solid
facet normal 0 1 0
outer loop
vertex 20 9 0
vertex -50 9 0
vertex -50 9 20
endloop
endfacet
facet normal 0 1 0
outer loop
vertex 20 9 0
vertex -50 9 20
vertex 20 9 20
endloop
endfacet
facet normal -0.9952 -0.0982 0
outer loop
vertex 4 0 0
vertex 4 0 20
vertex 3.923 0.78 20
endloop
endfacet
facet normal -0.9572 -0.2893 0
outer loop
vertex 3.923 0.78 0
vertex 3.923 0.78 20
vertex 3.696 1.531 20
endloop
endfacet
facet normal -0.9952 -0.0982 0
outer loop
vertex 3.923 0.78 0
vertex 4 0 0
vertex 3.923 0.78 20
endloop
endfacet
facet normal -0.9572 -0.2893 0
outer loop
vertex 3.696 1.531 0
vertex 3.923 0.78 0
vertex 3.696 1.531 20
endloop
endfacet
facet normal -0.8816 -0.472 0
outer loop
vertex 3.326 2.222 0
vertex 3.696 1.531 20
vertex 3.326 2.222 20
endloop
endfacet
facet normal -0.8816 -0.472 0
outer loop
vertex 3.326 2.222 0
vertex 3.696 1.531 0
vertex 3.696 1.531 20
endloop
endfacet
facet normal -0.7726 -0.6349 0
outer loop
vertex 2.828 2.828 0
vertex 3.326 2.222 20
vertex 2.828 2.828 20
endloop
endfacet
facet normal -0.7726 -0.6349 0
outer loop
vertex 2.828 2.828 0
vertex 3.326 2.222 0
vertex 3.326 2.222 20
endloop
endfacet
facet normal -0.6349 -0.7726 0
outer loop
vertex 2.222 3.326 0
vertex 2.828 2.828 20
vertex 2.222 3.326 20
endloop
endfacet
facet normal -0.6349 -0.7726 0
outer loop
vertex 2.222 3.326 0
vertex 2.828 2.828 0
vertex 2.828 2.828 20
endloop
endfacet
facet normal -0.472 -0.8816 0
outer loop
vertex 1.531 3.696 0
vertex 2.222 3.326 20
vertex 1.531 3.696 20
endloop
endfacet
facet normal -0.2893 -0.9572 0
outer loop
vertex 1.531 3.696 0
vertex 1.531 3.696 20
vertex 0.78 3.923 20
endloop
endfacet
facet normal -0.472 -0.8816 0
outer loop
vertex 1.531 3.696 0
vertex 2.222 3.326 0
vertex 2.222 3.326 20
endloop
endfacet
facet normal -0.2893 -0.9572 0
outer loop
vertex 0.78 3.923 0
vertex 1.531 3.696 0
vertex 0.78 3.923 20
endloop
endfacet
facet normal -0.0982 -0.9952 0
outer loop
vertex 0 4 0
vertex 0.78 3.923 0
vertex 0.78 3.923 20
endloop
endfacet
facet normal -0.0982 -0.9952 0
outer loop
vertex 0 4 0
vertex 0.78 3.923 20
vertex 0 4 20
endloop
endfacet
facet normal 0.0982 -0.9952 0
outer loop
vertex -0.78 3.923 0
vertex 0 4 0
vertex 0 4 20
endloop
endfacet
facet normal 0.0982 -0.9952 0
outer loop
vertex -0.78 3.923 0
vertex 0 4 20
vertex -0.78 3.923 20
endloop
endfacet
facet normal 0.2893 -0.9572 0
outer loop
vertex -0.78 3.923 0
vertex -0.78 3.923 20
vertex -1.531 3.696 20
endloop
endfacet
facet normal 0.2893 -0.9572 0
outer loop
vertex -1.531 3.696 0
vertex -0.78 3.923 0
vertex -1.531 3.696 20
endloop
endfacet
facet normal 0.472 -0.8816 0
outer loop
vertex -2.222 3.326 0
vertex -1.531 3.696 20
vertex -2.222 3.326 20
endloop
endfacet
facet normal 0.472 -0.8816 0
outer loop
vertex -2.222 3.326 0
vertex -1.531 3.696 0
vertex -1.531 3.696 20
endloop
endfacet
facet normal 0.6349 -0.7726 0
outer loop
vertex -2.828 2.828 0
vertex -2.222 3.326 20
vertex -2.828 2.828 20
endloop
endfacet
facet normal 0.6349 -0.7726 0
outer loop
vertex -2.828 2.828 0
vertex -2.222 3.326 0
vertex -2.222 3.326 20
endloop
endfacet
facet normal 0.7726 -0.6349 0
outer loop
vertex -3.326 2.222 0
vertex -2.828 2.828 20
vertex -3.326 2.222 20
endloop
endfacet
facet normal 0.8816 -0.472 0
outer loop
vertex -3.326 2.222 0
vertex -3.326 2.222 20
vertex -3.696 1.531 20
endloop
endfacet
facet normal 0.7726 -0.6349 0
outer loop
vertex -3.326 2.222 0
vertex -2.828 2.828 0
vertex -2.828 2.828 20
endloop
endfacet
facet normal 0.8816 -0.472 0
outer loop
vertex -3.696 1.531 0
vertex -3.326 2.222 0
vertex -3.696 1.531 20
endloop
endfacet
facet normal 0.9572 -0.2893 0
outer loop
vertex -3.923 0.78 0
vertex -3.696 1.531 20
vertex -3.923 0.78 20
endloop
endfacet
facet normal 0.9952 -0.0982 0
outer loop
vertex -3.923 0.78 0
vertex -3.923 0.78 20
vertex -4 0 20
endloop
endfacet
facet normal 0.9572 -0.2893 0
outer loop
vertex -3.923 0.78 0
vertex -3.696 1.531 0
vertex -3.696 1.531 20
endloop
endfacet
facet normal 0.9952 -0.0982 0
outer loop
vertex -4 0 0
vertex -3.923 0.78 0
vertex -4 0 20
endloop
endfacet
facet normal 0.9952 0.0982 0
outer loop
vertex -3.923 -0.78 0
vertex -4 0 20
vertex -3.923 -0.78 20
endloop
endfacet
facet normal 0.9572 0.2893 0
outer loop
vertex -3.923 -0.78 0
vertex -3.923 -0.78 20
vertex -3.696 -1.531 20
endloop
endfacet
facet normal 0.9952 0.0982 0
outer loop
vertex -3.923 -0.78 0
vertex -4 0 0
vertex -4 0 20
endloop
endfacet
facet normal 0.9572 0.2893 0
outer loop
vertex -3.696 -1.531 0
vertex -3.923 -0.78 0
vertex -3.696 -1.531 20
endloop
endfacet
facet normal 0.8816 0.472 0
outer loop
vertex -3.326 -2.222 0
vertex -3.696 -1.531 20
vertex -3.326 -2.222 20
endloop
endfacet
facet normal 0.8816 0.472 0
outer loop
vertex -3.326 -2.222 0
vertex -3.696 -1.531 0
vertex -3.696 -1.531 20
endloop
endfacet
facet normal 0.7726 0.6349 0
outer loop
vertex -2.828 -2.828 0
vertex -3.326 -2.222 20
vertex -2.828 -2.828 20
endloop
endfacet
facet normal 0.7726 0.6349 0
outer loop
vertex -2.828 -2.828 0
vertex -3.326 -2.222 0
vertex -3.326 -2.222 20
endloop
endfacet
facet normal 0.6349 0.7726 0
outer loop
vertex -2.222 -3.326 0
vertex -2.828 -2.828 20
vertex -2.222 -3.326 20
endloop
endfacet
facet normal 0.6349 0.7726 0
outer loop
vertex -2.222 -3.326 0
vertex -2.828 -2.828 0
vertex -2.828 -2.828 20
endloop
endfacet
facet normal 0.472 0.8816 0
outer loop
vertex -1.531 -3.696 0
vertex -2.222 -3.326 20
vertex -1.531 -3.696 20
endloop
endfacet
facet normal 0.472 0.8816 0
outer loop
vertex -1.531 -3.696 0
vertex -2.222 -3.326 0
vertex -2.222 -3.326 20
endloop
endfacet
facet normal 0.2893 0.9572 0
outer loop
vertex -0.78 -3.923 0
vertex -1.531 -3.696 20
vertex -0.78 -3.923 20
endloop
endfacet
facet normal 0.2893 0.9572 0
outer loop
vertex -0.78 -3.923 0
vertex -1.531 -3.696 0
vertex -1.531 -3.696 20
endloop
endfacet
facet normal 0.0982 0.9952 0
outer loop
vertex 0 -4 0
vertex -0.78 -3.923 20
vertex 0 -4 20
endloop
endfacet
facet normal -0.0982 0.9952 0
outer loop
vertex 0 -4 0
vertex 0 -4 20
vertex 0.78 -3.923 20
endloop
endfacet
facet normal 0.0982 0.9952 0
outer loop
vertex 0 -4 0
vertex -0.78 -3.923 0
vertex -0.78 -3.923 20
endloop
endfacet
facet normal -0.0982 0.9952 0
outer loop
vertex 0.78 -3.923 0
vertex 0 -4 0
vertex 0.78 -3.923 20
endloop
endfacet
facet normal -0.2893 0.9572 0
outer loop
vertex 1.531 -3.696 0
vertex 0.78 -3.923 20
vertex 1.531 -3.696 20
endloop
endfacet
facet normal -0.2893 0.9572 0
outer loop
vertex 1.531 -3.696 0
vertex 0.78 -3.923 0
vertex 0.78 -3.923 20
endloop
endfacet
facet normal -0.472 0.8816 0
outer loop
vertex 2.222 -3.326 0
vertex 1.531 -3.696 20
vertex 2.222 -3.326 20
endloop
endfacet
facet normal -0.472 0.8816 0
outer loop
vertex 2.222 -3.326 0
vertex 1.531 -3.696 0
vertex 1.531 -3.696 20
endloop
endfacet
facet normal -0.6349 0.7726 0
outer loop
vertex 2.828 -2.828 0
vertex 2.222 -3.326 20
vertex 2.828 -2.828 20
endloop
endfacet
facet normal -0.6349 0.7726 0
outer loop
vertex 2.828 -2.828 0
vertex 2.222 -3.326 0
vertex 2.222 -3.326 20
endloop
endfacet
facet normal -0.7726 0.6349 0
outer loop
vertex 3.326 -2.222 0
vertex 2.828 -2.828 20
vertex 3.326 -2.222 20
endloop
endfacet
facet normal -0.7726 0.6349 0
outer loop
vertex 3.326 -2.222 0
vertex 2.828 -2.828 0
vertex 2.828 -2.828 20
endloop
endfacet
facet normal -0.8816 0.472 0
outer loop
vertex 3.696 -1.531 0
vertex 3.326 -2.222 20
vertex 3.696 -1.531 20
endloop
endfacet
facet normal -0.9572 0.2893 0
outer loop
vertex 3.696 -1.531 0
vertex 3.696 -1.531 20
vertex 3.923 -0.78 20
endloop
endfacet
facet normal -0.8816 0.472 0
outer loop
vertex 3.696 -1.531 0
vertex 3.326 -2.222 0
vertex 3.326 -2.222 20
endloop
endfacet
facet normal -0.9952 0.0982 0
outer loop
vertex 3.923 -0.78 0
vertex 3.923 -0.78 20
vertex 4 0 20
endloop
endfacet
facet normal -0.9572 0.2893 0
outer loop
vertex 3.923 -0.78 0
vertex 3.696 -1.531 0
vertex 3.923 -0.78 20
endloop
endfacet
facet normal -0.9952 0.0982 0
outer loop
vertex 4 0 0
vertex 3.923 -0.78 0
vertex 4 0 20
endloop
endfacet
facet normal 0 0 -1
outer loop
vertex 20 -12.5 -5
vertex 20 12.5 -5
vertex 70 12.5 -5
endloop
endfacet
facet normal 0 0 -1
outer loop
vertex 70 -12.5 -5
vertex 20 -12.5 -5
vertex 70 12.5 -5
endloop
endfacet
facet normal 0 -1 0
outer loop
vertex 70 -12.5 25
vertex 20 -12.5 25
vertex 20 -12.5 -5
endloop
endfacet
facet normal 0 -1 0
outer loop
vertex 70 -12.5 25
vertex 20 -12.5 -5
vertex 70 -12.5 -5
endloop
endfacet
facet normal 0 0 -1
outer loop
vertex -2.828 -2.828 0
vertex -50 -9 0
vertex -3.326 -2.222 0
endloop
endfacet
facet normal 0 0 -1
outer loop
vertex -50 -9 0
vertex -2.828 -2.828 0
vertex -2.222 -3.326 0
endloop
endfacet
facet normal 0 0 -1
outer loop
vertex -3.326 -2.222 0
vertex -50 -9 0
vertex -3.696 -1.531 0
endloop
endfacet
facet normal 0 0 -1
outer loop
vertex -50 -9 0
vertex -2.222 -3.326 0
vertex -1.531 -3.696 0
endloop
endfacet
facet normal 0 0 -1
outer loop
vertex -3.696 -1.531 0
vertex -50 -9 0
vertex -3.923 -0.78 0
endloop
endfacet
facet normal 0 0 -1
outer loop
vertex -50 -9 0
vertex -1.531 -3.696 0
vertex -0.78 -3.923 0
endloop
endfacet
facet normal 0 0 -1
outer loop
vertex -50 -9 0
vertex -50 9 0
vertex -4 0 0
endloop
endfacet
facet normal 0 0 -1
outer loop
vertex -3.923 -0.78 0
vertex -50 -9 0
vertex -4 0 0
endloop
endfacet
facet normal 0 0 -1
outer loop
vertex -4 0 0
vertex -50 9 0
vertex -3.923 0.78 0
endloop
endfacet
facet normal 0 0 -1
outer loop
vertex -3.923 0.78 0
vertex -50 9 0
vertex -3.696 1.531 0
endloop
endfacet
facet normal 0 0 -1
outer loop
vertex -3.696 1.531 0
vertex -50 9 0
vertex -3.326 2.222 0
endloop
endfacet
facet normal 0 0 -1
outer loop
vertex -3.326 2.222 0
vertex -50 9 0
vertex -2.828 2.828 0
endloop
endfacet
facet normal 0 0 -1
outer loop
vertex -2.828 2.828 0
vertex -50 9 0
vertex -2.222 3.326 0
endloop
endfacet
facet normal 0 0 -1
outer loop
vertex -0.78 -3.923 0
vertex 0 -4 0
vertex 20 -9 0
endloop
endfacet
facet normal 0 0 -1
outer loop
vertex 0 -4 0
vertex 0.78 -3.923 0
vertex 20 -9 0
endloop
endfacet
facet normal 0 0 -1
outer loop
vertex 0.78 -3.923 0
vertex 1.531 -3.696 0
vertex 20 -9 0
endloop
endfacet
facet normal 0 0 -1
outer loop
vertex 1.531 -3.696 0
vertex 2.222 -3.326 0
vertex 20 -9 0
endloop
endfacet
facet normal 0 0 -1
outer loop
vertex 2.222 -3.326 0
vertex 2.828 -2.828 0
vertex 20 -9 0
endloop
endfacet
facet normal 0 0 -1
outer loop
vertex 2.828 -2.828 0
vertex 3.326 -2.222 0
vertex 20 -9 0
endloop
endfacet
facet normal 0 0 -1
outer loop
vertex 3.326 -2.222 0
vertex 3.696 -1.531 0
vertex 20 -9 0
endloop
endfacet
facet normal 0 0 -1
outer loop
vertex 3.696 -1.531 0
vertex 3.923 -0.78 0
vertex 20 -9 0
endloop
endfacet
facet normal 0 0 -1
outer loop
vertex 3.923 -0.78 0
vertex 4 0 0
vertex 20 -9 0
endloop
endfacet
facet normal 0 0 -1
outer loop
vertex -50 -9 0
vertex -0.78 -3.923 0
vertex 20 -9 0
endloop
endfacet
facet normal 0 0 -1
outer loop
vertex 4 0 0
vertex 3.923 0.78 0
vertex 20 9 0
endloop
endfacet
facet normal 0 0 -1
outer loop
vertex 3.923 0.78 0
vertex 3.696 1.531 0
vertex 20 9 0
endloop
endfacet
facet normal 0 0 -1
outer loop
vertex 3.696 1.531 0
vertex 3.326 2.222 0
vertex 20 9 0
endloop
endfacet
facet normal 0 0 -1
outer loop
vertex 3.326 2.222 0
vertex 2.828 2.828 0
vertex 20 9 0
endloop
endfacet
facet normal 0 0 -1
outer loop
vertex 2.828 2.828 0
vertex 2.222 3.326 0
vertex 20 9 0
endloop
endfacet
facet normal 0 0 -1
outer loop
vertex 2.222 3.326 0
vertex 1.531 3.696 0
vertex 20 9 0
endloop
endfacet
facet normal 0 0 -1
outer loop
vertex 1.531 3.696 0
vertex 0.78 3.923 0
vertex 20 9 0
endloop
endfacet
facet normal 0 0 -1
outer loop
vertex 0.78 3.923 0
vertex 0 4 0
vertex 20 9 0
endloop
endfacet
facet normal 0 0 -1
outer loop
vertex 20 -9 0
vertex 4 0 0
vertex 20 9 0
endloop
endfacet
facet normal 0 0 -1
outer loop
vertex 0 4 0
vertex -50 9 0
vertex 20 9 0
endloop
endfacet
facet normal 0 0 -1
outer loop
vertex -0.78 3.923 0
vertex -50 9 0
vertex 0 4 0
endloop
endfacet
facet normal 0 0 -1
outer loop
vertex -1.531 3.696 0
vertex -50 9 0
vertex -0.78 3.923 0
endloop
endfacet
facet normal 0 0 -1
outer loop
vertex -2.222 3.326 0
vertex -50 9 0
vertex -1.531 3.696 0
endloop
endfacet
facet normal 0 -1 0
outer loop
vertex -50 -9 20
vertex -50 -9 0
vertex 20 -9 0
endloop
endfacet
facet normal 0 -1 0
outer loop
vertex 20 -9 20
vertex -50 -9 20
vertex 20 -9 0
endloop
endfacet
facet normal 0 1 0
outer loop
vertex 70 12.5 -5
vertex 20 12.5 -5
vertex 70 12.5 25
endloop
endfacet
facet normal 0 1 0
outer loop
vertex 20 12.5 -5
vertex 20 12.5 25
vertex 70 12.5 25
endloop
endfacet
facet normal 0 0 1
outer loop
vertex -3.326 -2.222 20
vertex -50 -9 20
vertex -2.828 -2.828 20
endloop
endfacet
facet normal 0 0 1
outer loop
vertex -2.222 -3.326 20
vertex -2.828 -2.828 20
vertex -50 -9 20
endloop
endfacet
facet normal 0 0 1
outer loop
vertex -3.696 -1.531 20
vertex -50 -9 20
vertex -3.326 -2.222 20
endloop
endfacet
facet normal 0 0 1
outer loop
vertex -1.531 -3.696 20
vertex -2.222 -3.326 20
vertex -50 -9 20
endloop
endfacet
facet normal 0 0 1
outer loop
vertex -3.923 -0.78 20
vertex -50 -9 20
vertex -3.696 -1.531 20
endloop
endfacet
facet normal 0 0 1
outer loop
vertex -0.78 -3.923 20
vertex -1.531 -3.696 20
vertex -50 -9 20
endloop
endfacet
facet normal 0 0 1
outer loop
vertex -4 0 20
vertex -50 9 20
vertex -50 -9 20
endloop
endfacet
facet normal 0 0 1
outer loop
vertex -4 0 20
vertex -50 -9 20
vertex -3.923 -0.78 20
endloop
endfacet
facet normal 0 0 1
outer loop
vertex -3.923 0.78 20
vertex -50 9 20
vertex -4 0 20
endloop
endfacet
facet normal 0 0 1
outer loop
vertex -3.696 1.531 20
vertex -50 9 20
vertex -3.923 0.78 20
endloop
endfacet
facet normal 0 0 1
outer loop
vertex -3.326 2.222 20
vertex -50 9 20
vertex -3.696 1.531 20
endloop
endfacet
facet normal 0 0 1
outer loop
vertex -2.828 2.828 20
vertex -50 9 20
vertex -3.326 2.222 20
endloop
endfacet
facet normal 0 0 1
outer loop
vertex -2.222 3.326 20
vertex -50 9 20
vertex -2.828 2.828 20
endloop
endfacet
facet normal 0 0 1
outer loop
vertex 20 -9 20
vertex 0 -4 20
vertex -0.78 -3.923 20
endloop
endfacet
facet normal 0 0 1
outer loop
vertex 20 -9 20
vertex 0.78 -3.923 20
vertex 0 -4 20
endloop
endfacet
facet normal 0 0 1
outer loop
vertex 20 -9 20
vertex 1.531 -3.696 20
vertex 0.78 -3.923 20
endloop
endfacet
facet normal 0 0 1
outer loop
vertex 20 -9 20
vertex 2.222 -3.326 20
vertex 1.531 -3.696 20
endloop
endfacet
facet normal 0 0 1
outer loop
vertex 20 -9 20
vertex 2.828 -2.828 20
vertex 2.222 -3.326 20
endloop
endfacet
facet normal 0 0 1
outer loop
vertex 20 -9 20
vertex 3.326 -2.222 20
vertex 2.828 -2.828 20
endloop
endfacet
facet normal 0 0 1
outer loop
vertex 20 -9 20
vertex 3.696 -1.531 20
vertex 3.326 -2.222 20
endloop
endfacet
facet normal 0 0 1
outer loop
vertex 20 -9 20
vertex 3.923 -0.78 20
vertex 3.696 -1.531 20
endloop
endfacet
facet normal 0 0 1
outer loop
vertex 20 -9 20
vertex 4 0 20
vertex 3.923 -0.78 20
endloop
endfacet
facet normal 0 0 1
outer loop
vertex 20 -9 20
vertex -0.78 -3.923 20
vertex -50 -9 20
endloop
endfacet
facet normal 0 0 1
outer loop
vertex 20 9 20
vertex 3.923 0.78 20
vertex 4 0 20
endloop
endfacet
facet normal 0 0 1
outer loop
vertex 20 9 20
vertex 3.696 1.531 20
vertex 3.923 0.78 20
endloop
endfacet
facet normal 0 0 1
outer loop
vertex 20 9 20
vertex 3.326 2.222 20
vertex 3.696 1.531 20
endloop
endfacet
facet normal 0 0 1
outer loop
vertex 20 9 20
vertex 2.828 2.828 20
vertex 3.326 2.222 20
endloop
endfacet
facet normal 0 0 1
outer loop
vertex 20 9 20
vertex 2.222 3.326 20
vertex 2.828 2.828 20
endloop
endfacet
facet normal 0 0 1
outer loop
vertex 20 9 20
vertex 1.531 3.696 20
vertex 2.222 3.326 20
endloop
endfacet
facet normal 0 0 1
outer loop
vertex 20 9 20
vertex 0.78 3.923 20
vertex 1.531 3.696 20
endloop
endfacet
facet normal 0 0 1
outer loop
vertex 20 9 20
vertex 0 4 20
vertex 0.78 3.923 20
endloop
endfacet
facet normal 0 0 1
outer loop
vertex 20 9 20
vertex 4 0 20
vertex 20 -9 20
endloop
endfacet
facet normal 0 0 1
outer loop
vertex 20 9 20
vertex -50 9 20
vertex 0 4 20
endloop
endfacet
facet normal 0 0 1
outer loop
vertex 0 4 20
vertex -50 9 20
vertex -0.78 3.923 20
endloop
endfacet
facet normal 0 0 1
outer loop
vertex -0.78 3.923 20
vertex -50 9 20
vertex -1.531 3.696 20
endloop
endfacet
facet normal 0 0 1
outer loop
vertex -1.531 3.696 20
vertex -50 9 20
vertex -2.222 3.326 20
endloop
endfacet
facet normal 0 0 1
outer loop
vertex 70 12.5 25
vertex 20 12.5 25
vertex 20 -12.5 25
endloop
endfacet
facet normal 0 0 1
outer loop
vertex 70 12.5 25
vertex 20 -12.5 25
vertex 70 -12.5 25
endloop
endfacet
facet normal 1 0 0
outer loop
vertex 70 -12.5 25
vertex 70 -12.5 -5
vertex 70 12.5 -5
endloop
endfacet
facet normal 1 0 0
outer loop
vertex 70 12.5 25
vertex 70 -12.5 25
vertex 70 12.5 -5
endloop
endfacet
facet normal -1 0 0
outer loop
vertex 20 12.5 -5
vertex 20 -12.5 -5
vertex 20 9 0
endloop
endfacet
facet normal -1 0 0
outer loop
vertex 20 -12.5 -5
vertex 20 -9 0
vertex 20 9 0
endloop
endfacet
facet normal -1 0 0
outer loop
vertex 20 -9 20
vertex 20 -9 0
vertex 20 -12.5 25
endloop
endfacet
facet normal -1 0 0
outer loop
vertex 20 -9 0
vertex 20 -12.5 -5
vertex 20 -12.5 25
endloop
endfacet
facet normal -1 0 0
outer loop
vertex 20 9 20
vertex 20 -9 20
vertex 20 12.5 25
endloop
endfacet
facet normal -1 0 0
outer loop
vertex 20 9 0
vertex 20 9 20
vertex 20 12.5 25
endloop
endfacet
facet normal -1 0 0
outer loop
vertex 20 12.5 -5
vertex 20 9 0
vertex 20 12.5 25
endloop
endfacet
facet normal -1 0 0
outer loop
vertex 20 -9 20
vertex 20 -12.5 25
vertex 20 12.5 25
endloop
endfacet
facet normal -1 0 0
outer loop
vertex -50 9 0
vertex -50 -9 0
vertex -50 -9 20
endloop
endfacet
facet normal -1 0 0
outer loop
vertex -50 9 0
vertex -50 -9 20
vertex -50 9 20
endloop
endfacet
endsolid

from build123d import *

# Parameters (mm, degrees)
SKETCH1_W           = 100
SKETCH1_H           = 18
SKETCH1_R           = 4
BOSS_EXTRUDE1_DEPTH = 20
SKETCH2_W           = 50
SKETCH2_H           = 25
BOSS_EXTRUDE2_DEPTH = 15


with BuildPart() as part:
    # Sketch1 → Boss-Extrude1 (new body)
    with BuildSketch(Plane.XY):
        Rectangle(SKETCH1_W, SKETCH1_H)
        Circle(SKETCH1_R, mode=Mode.SUBTRACT)
    extrude(amount=BOSS_EXTRUDE1_DEPTH)

    # Sketch2 → Boss-Extrude2 (add, symmetric)
    with BuildSketch(Plane.XY.offset(10)):
        with Locations((45, 0)):
            Rectangle(SKETCH2_W, SKETCH2_H)
    extrude(amount=BOSS_EXTRUDE2_DEPTH, both=True)


solid = part.part
